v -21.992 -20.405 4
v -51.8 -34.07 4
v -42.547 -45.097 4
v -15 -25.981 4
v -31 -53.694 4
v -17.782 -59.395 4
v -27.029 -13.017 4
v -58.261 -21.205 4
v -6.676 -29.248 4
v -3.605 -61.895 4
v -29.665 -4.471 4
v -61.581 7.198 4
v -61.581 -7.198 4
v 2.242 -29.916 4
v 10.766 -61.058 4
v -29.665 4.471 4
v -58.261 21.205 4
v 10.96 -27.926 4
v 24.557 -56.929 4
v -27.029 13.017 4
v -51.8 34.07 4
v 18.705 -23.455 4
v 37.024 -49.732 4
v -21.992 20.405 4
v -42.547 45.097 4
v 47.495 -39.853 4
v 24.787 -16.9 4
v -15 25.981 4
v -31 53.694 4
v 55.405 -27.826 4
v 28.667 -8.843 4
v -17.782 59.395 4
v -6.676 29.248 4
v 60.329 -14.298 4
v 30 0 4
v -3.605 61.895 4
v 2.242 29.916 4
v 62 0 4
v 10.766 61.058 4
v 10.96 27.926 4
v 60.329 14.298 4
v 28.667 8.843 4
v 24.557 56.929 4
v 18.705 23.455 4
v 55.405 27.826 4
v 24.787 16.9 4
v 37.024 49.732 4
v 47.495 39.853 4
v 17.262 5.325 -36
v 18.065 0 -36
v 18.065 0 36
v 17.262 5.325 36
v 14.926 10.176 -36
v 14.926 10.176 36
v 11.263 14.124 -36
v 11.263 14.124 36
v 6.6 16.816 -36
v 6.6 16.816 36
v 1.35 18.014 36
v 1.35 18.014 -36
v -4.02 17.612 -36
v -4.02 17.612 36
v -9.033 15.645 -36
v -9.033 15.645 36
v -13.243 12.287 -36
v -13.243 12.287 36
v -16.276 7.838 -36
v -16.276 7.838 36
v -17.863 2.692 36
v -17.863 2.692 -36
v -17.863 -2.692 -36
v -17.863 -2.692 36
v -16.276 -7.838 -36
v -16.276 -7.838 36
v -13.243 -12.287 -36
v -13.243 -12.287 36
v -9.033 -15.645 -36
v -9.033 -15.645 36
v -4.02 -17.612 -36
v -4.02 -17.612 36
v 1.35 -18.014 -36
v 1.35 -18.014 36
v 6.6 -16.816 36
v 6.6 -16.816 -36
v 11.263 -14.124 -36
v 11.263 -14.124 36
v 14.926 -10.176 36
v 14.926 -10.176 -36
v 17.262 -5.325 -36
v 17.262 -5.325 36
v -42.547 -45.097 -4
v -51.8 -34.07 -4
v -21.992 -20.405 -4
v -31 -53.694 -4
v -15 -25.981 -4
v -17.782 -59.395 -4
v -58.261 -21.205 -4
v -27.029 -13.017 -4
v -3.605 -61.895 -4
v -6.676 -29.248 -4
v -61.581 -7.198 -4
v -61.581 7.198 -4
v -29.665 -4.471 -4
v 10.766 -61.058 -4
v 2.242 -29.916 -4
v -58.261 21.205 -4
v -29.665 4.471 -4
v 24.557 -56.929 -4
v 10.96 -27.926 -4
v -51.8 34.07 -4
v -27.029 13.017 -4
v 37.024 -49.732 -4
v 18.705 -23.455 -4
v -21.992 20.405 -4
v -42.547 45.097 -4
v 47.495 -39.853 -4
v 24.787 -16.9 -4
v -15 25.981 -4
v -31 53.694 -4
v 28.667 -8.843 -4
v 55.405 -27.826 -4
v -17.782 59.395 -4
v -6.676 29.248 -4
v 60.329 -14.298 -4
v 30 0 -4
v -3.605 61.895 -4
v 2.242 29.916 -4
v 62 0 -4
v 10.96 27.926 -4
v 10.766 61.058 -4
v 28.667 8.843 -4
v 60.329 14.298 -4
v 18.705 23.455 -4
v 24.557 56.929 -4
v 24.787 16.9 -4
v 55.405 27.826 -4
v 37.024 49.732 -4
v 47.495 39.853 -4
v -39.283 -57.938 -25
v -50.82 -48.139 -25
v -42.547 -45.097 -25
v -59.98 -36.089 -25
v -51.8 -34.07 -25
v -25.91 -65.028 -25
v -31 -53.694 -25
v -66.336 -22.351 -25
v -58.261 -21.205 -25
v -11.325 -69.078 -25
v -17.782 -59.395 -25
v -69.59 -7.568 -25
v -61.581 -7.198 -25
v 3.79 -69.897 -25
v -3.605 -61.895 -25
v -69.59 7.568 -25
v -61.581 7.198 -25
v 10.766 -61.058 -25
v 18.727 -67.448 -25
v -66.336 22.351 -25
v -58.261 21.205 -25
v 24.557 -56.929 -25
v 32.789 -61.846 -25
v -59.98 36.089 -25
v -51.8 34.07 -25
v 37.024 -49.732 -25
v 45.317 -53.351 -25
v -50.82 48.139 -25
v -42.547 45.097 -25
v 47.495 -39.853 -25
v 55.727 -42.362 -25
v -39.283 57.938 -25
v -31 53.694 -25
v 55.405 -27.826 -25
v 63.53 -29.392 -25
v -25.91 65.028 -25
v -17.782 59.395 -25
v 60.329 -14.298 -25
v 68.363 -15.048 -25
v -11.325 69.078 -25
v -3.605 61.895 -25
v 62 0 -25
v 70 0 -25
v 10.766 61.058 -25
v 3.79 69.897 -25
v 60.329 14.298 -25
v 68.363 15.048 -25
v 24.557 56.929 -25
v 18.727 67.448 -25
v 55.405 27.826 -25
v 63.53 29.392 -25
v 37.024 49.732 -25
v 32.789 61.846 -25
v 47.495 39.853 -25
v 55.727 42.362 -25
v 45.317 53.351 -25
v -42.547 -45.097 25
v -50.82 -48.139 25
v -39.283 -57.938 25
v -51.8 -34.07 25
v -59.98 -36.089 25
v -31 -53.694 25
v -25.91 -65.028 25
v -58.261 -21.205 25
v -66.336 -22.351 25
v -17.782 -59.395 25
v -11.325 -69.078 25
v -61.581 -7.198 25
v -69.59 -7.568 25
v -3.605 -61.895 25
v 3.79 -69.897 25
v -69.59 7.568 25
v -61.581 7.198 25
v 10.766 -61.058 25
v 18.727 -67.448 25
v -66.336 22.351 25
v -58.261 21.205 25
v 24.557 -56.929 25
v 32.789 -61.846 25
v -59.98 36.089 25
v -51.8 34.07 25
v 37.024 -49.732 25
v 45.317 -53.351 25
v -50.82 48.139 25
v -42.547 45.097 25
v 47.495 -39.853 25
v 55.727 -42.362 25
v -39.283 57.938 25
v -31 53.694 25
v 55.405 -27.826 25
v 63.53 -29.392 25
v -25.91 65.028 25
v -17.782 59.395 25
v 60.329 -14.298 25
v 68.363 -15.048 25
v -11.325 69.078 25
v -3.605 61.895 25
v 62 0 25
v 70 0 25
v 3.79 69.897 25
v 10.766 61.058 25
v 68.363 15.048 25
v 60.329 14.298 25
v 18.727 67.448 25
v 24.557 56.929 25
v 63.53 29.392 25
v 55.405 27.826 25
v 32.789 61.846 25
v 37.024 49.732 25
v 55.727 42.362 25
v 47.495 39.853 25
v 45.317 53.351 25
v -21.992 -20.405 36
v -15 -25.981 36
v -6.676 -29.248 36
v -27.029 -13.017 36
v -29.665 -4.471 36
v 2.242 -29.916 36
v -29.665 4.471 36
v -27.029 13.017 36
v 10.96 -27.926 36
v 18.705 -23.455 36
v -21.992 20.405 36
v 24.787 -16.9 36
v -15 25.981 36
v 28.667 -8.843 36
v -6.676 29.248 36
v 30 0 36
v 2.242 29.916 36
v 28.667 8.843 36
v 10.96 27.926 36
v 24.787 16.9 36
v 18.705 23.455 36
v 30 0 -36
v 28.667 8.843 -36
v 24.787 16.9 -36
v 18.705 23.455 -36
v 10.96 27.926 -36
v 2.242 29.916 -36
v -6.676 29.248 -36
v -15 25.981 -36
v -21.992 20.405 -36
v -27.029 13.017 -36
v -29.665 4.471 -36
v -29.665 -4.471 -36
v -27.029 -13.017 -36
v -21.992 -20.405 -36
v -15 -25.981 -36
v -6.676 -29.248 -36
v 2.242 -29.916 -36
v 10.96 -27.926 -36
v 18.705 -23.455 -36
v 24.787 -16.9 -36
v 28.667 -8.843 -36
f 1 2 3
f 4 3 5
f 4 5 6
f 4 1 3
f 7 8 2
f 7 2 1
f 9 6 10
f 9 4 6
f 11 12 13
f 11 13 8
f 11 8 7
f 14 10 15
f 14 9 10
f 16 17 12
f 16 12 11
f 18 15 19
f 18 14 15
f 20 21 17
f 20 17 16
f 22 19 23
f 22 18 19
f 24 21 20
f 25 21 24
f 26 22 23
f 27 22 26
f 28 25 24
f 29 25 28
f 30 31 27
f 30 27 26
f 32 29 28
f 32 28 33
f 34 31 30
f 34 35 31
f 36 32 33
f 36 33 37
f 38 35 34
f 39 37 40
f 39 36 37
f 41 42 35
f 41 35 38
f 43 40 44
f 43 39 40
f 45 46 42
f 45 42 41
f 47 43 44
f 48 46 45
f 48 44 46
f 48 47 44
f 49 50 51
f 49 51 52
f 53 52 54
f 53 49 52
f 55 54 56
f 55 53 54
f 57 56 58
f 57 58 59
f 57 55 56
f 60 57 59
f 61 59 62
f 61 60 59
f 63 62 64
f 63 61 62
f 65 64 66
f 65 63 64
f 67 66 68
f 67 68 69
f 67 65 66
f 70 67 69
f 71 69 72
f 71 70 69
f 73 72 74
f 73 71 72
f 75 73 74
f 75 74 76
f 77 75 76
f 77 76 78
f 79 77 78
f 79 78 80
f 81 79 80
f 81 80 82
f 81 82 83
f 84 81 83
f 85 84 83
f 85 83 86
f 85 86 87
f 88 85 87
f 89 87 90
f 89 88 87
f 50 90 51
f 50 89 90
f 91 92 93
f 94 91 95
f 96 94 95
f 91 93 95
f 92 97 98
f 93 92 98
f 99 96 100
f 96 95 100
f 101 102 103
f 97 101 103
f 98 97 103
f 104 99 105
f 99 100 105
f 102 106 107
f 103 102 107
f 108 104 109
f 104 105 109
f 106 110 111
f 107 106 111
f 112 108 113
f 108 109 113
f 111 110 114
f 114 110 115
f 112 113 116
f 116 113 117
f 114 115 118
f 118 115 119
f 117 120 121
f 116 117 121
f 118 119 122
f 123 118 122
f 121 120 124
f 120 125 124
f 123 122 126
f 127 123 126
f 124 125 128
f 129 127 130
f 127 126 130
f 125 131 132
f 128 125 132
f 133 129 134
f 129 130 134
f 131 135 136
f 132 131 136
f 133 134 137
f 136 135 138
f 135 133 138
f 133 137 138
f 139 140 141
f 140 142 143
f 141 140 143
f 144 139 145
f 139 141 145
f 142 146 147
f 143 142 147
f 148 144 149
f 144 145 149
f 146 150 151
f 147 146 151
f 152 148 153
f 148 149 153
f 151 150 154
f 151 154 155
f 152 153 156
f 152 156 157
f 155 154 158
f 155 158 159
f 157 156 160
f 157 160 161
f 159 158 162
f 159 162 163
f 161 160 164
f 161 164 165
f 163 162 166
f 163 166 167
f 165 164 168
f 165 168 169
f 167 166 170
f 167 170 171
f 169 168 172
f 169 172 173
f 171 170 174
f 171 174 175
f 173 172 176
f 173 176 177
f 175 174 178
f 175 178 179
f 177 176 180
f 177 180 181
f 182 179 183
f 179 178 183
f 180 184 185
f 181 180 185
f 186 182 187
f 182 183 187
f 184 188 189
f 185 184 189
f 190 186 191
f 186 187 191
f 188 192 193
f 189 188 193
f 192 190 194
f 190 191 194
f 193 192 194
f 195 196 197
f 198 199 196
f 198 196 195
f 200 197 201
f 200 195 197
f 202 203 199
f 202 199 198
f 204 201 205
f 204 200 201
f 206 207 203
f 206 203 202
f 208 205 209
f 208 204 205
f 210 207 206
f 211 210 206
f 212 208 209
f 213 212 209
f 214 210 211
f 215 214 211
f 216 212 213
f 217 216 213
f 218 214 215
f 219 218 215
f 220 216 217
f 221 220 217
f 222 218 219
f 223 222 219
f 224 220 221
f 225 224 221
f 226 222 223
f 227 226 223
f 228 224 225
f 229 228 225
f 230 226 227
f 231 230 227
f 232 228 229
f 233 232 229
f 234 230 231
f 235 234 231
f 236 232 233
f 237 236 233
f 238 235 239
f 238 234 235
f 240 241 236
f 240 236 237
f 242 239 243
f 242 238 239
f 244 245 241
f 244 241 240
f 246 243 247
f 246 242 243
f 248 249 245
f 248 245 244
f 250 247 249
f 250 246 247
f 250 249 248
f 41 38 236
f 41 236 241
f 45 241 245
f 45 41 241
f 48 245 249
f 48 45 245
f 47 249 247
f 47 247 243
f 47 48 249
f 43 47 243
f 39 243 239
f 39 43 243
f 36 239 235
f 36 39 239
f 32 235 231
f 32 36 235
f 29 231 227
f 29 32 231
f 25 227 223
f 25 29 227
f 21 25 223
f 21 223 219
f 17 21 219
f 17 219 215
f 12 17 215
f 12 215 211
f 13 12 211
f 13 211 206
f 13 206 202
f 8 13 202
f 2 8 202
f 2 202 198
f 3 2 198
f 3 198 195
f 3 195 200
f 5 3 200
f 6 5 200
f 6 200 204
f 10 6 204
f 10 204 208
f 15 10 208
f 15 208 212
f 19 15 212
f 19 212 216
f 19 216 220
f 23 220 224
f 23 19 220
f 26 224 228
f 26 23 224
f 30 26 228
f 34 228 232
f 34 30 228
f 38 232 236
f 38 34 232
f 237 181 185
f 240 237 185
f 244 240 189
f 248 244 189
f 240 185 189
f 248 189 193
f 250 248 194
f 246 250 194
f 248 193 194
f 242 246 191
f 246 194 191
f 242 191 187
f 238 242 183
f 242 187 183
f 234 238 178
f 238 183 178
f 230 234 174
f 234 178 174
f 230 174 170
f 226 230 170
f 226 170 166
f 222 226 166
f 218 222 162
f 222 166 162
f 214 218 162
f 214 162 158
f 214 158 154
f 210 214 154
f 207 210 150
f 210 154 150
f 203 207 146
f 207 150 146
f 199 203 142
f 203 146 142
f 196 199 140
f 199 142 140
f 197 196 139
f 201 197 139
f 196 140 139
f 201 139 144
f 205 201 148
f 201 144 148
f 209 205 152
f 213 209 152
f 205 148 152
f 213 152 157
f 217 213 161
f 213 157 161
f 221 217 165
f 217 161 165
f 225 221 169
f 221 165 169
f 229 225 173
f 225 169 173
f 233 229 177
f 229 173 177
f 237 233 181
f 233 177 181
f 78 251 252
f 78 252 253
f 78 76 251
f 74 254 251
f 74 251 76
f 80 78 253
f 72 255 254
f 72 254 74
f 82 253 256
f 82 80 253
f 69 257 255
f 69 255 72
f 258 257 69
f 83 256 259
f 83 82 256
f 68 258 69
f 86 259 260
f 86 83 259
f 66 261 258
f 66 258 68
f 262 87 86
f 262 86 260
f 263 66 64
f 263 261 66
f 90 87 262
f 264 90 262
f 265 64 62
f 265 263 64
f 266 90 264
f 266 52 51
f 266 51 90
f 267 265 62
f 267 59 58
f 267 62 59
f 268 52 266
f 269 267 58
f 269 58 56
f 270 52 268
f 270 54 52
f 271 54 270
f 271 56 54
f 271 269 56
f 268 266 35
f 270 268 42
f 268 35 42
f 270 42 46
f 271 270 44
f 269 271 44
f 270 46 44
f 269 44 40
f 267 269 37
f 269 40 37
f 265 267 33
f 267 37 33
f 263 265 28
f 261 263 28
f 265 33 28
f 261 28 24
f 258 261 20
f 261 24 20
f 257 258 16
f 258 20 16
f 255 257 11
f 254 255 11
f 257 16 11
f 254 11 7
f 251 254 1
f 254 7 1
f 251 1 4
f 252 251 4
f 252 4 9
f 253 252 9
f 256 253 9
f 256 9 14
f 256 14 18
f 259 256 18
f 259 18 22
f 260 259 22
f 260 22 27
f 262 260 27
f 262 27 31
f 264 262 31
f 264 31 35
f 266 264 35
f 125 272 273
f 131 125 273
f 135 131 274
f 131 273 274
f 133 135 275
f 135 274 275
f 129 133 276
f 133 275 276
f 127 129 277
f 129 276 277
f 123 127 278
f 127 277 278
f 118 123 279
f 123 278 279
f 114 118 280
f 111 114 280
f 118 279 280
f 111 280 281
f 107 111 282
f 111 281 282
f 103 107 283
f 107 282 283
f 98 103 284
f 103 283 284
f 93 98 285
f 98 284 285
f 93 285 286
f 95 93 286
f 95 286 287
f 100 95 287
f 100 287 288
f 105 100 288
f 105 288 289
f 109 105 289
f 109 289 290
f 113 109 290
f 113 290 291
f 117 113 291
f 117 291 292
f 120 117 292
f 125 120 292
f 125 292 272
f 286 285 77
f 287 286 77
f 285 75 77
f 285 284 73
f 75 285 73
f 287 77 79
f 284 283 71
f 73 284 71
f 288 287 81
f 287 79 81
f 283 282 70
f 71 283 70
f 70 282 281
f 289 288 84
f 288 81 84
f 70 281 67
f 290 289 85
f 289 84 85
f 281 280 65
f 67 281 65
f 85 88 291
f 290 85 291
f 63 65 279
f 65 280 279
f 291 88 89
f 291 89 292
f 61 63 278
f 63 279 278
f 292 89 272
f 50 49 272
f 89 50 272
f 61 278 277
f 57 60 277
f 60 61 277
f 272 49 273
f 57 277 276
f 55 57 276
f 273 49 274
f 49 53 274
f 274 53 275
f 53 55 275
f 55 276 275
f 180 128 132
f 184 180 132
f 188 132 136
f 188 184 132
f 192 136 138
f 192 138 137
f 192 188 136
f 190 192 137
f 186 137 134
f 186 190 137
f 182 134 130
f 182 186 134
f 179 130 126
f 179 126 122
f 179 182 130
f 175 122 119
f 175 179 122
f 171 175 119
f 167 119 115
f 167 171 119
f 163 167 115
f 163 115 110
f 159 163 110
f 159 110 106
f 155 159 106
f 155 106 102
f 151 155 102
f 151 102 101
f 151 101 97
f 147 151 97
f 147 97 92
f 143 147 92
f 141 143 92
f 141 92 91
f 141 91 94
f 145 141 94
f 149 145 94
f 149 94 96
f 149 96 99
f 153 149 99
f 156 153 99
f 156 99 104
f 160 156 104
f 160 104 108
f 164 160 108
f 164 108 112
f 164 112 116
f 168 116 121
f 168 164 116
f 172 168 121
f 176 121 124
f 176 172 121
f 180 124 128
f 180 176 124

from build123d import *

# Parameters (mm, degrees)
BOSS_EXTRUDE1_DEPTH      = 36
BOSS_EXTRUDE1_DEPTH_BACK = 36
SKETCH1_R                = 30
SKETCH1_R_2              = 18.065
BOSS_EXTRUDE2_DEPTH      = 4
BOSS_EXTRUDE2_DEPTH_BACK = 4
SKETCH1_3_R              = 62
SKETCH1_3_R_2            = 30
BOSS_EXTRUDE3_DEPTH      = 25
BOSS_EXTRUDE3_DEPTH_BACK = 25
SKETCH1_4_R              = 70
SKETCH1_4_R_2            = 62


with BuildPart() as part:
    # Sketch1 → Boss-Extrude1 (new, two sides: drawn at the far end of the back side and taken through both)
    with BuildSketch(Plane.XY.offset(-BOSS_EXTRUDE1_DEPTH_BACK)):
        Circle(SKETCH1_R)
        Circle(SKETCH1_R_2, mode=Mode.SUBTRACT)
    extrude(amount=BOSS_EXTRUDE1_DEPTH + BOSS_EXTRUDE1_DEPTH_BACK)

    # Sketch1<3> → Boss-Extrude2 (add, two sides: drawn at the far end of the back side and taken through both)
    with BuildSketch(Plane.XY.offset(-BOSS_EXTRUDE2_DEPTH_BACK)):
        Circle(SKETCH1_3_R)
        Circle(SKETCH1_3_R_2, mode=Mode.SUBTRACT)
    extrude(amount=BOSS_EXTRUDE2_DEPTH + BOSS_EXTRUDE2_DEPTH_BACK)

    # Sketch1<4> → Boss-Extrude3 (add, two sides: drawn at the far end of the back side and taken through both)
    with BuildSketch(Plane.XY.offset(-BOSS_EXTRUDE3_DEPTH_BACK)):
        Circle(SKETCH1_4_R)
        Circle(SKETCH1_4_R_2, mode=Mode.SUBTRACT)
    extrude(amount=BOSS_EXTRUDE3_DEPTH + BOSS_EXTRUDE3_DEPTH_BACK)


solid = part.part
